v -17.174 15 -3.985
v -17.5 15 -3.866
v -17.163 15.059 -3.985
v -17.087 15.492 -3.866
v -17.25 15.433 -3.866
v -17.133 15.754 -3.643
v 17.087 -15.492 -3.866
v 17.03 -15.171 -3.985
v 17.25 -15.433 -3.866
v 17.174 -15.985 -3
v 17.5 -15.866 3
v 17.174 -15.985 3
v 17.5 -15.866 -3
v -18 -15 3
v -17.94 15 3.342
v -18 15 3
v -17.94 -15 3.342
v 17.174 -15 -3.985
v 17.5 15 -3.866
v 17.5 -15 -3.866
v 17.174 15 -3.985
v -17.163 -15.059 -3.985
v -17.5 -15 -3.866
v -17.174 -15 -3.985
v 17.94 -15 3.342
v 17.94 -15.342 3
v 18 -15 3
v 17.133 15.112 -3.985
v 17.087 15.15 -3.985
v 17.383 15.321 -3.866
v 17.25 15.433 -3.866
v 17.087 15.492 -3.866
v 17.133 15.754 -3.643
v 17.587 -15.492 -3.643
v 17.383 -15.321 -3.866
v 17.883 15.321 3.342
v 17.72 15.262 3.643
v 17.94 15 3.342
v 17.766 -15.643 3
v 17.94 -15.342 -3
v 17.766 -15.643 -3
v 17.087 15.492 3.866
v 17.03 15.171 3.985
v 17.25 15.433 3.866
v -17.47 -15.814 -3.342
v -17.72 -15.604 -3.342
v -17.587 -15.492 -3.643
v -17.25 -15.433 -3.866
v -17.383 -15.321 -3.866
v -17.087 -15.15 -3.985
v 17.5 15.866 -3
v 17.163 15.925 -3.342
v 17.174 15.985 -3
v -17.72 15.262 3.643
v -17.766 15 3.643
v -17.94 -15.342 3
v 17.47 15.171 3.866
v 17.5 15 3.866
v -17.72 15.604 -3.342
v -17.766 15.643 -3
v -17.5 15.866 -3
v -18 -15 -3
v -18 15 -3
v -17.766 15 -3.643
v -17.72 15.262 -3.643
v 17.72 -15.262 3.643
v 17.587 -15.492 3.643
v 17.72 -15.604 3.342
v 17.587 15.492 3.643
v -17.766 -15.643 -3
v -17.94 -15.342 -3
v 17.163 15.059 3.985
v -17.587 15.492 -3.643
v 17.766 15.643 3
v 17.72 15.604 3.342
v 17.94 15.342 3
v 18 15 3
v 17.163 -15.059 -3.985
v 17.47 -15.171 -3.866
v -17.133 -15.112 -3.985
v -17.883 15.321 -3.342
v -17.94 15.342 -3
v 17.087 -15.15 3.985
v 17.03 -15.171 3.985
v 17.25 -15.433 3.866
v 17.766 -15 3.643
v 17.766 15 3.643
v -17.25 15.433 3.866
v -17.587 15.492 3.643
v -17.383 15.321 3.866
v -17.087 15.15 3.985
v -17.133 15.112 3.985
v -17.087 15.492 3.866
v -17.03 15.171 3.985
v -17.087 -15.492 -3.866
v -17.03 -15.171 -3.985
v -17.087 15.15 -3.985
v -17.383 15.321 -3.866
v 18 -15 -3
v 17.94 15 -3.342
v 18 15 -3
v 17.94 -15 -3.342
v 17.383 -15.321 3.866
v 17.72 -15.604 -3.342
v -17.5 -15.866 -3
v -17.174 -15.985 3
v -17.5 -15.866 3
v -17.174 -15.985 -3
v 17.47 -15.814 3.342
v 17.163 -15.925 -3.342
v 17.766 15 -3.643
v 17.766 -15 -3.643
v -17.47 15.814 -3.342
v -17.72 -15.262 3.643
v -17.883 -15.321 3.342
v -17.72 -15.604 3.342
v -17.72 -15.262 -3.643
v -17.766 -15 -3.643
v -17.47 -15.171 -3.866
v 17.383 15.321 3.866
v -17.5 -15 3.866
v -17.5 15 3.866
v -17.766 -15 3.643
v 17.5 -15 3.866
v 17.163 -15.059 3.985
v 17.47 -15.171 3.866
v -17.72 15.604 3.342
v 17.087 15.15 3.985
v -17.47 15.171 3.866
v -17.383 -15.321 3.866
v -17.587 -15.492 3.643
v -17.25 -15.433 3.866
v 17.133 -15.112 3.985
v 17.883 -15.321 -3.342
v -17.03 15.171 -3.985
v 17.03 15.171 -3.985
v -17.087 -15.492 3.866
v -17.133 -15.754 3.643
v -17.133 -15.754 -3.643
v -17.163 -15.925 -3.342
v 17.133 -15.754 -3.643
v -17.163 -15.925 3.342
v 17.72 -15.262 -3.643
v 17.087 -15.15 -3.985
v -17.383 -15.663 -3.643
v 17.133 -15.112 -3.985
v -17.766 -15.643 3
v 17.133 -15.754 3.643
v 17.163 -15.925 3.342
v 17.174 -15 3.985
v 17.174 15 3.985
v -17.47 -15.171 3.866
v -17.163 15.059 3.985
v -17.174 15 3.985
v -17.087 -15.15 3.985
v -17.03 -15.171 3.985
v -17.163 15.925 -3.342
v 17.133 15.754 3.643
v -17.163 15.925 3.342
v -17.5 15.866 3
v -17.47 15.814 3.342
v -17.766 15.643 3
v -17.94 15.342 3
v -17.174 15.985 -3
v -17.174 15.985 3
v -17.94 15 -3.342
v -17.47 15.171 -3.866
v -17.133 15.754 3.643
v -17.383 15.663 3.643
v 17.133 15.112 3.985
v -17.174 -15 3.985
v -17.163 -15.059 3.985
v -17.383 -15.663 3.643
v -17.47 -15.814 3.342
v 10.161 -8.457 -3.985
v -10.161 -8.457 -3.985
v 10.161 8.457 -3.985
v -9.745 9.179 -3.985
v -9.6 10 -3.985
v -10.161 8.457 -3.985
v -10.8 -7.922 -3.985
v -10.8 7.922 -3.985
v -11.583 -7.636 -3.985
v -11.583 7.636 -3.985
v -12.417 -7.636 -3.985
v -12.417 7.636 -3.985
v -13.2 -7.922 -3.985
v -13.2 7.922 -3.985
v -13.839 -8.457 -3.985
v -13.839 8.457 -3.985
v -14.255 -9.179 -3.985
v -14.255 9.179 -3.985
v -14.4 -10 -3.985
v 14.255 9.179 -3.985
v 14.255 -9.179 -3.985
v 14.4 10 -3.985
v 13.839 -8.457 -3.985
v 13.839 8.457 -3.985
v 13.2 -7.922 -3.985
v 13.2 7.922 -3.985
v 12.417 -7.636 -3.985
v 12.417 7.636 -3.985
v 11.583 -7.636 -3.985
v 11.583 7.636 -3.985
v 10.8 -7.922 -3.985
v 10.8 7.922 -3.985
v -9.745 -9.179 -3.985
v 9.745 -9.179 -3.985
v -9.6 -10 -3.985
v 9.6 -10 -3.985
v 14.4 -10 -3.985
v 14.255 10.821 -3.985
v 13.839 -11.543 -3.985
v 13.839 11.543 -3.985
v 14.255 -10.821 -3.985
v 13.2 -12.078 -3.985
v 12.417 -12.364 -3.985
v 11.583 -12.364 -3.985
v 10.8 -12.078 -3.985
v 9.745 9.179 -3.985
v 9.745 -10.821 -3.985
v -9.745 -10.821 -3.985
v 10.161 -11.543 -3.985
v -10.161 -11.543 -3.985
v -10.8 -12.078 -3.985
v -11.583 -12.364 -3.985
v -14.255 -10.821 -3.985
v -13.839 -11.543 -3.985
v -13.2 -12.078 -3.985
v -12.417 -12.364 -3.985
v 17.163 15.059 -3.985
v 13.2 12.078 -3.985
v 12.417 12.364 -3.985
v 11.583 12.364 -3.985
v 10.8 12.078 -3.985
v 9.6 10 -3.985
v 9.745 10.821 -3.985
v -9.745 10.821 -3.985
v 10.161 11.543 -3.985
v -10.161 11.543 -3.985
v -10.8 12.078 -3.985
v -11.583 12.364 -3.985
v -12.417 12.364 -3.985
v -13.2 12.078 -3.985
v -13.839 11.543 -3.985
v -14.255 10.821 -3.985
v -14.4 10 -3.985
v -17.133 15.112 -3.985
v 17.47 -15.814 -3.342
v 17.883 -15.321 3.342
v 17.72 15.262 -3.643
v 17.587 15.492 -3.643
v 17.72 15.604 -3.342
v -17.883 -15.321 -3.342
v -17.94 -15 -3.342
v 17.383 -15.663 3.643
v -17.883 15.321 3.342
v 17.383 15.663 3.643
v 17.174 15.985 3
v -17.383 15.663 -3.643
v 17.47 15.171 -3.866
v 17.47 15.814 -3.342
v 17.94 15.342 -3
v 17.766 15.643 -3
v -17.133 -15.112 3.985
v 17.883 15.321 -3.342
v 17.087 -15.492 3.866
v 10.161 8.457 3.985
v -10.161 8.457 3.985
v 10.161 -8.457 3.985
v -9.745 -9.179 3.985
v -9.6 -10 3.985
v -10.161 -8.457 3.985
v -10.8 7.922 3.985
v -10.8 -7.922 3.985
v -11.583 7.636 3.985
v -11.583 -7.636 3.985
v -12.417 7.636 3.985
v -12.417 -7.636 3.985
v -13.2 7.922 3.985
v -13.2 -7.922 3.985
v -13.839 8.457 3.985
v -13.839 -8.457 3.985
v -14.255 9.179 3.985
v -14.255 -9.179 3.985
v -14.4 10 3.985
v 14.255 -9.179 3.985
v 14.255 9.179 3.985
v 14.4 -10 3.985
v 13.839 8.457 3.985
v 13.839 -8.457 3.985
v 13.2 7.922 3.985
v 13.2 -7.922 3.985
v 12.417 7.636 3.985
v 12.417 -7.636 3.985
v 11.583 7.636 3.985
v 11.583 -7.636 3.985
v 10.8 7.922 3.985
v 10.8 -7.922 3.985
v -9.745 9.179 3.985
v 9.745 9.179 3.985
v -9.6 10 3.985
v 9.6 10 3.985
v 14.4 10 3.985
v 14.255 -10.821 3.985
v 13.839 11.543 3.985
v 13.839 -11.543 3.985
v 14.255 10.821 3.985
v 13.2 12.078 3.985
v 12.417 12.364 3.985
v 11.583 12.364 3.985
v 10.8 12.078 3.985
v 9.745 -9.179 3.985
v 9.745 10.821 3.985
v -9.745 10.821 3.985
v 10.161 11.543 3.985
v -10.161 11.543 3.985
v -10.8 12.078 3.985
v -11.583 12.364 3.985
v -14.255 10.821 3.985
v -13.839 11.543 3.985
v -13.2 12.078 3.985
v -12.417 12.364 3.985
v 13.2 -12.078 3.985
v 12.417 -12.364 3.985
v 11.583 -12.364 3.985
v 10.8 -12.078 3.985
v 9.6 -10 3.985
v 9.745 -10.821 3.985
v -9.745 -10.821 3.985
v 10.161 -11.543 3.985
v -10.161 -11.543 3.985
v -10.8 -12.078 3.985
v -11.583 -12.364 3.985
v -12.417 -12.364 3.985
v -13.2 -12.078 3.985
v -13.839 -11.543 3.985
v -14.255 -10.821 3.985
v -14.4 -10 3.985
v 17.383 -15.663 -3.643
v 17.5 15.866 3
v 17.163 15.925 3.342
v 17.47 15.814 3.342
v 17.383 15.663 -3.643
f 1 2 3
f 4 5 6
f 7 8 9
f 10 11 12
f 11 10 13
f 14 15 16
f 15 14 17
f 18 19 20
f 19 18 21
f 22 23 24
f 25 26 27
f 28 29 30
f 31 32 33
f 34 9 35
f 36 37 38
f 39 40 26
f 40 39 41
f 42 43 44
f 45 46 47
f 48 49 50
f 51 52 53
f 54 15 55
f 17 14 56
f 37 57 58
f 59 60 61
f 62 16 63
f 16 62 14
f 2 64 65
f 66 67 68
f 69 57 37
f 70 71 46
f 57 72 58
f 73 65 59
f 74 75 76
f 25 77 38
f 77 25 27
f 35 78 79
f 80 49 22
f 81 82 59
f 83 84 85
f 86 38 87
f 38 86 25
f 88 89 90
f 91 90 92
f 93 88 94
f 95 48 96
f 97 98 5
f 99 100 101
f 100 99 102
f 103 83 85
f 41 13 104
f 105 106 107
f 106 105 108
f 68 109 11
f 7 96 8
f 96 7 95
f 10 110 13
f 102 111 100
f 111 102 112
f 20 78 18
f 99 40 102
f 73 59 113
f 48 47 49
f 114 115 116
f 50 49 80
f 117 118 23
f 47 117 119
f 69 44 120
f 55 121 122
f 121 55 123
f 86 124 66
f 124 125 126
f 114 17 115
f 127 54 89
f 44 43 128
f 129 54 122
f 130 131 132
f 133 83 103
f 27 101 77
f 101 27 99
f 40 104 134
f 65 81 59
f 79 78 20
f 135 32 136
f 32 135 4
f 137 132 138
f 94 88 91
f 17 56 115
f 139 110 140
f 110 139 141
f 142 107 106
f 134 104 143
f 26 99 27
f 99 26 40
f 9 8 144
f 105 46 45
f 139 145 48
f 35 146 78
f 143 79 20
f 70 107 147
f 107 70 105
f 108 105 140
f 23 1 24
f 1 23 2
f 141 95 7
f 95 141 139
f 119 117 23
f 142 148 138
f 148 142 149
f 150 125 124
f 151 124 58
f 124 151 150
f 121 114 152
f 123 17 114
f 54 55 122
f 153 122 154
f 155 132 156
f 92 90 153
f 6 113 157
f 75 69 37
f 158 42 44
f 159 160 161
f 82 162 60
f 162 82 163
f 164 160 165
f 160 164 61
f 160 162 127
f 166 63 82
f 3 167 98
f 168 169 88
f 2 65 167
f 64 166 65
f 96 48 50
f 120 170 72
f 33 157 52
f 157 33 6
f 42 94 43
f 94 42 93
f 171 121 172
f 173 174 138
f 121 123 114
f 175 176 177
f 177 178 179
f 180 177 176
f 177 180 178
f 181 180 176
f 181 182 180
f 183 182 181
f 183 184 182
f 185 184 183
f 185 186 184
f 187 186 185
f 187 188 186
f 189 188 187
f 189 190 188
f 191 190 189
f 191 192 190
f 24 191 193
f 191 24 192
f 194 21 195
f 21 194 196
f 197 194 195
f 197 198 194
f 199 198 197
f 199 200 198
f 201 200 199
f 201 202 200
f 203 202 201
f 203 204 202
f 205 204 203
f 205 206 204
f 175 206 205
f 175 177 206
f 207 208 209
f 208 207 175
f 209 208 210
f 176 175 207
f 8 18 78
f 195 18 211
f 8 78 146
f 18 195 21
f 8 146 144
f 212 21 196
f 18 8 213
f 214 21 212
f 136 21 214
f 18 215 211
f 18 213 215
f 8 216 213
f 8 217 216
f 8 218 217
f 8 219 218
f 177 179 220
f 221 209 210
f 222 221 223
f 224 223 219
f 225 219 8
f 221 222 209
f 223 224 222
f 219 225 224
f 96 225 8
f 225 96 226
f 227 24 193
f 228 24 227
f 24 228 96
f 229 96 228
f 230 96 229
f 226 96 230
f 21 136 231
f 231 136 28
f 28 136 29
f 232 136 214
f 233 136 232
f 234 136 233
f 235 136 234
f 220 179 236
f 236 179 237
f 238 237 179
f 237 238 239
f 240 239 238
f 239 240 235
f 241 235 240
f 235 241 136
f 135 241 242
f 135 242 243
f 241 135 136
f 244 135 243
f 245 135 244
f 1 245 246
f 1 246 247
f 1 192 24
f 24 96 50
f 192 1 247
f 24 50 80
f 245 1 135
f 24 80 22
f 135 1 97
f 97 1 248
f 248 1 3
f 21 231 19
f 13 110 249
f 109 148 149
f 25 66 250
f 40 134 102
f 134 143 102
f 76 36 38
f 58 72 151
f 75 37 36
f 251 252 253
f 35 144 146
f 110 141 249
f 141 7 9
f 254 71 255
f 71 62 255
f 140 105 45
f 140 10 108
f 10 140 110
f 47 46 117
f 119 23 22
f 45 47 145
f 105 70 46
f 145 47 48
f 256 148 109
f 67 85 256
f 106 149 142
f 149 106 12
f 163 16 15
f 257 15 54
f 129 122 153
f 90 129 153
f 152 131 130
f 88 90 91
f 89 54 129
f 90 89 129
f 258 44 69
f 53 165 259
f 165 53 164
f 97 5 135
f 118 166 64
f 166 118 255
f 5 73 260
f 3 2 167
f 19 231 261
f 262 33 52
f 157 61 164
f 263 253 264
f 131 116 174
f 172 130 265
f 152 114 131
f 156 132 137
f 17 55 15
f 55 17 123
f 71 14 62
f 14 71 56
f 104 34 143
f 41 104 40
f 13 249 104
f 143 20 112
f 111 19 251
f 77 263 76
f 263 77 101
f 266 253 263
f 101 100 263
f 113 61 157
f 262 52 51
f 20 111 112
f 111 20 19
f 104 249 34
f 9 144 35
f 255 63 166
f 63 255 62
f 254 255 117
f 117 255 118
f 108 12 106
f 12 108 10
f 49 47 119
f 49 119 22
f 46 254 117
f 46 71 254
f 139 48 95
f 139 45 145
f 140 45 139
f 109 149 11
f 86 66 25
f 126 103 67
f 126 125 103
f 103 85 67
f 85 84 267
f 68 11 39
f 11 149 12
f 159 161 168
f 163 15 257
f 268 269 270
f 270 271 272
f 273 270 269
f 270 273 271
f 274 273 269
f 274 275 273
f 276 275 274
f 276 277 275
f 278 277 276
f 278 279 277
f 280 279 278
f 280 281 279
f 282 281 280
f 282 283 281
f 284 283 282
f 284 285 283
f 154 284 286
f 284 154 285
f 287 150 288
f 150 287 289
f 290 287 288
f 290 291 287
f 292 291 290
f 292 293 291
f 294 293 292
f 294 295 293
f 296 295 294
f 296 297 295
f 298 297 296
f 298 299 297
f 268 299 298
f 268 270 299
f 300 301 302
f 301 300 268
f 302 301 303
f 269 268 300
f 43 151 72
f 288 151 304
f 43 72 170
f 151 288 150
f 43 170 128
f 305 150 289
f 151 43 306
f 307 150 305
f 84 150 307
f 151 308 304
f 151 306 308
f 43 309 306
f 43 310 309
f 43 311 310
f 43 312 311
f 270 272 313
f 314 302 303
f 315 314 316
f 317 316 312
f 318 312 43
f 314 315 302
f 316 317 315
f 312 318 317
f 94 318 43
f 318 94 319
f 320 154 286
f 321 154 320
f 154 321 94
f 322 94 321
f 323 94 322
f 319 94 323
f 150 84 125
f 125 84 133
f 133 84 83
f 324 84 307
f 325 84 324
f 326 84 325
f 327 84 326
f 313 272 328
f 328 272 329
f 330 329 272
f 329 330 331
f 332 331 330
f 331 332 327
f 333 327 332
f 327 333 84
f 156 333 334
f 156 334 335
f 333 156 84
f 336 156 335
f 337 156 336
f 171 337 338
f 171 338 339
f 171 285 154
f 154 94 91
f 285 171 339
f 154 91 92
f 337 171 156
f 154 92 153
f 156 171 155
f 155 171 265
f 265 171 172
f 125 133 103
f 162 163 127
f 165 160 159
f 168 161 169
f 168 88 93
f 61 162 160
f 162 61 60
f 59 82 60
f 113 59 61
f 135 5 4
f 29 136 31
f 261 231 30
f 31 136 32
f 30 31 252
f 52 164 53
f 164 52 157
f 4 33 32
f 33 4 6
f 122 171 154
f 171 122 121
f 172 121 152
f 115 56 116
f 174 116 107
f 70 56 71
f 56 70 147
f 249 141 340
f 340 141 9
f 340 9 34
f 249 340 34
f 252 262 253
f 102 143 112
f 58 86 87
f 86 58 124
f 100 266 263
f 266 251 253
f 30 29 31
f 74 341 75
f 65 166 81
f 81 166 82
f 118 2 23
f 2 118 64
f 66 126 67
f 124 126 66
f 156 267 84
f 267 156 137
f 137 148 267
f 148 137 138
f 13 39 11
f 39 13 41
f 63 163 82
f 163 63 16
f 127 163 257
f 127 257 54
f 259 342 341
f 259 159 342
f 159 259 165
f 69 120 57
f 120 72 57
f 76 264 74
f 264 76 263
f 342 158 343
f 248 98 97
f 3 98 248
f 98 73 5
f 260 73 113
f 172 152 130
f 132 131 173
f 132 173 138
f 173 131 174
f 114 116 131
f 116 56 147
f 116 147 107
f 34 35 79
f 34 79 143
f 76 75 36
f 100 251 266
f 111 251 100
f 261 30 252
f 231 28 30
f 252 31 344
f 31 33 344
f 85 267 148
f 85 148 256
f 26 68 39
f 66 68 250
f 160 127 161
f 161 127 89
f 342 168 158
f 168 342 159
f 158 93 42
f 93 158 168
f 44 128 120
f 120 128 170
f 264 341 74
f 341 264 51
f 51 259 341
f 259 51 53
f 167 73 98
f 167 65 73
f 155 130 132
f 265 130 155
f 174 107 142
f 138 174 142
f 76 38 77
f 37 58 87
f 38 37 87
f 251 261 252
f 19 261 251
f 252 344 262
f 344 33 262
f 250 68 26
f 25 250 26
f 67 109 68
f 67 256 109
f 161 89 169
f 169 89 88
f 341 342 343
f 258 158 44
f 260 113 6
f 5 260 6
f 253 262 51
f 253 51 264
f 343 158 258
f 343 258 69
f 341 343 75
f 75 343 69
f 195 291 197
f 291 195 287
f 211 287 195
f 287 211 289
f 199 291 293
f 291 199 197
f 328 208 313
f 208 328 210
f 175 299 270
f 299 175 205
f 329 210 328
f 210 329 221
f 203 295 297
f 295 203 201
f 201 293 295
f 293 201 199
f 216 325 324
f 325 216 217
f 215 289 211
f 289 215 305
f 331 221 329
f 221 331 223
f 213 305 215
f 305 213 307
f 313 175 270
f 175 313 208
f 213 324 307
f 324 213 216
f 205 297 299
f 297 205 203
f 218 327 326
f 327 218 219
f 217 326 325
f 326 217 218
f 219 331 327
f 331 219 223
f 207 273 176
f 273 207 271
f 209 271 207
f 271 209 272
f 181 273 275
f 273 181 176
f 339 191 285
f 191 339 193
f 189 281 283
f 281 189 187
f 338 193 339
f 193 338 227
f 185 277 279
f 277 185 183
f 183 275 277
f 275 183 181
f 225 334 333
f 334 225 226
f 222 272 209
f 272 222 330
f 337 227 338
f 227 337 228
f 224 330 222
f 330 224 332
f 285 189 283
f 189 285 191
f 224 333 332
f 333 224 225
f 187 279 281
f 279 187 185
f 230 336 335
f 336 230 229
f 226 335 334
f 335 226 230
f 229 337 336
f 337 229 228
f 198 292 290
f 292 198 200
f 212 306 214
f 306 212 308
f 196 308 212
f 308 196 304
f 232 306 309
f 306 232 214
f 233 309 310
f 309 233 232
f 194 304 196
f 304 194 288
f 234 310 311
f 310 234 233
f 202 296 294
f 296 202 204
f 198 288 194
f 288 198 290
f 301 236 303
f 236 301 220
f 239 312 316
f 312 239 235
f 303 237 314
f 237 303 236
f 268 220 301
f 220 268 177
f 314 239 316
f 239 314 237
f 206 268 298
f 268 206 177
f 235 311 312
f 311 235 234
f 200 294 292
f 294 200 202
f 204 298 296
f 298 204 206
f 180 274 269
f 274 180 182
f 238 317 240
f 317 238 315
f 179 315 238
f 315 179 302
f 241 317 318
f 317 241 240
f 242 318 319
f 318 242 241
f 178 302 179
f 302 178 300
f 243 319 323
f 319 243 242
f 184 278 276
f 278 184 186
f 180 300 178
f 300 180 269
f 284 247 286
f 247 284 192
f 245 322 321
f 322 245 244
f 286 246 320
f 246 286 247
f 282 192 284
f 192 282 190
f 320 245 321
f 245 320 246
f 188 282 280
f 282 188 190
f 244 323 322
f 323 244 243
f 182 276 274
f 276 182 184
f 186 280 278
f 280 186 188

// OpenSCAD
thickness = 8;
slotted = false;

blind_spacer(h=thickness, slotted=slotted, $fn=18);


module blind_spacer(h, slotted=false) {
  size = [36, 32, h];
  hole_xy = [12, 10];
  hole_d = 4.8;
  
  if (slotted) {
    blind_spacer_slotted(size, hole_xy, hole_d);
  } else {
    blind_spacer_holes(size, hole_xy, hole_d);
  };
};


module rounded_cube(size, r, center=true) {
  minkowski() {
    cube(size - 2*r*[1, 1, 1], center=center);
    sphere(r=r);
  };
};


module blind_spacer_slotted(size, hole_xy, hole_d) {
  h = size.z;
  hole_x = hole_xy.x;
  hole_y = hole_xy.y;
  difference() {
    rounded_cube(size, r=1, center=true);
    hull() {
      translate([hole_x, -hole_y, 0]) cylinder(h=h+1, d=hole_d, center=true);
      translate([-hole_x, -hole_y, 0]) cylinder(h=h+1, d=hole_d, center=true);
    };
    hull() {
      translate([hole_x, hole_y, 0]) cylinder(h=h+1, d=hole_d, center=true);
      translate([-hole_x, hole_y, 0]) cylinder(h=h+1, d=hole_d, center=true);
    };
  };
};


module blind_spacer_holes(size, hole_xy, hole_d) {
  h = size.z;
  hole_x = hole_xy.x;
  hole_y = hole_xy.y;
  difference() {
    rounded_cube(size, r=1, center=true);
    translate([hole_x, -hole_y, 0]) cylinder(h=h+1, d=hole_d, center=true);
    translate([-hole_x, -hole_y, 0]) cylinder(h=h+1, d=hole_d, center=true);
    translate([hole_x, hole_y, 0]) cylinder(h=h+1, d=hole_d, center=true);
    translate([-hole_x, hole_y, 0]) cylinder(h=h+1, d=hole_d, center=true);
  };
};
